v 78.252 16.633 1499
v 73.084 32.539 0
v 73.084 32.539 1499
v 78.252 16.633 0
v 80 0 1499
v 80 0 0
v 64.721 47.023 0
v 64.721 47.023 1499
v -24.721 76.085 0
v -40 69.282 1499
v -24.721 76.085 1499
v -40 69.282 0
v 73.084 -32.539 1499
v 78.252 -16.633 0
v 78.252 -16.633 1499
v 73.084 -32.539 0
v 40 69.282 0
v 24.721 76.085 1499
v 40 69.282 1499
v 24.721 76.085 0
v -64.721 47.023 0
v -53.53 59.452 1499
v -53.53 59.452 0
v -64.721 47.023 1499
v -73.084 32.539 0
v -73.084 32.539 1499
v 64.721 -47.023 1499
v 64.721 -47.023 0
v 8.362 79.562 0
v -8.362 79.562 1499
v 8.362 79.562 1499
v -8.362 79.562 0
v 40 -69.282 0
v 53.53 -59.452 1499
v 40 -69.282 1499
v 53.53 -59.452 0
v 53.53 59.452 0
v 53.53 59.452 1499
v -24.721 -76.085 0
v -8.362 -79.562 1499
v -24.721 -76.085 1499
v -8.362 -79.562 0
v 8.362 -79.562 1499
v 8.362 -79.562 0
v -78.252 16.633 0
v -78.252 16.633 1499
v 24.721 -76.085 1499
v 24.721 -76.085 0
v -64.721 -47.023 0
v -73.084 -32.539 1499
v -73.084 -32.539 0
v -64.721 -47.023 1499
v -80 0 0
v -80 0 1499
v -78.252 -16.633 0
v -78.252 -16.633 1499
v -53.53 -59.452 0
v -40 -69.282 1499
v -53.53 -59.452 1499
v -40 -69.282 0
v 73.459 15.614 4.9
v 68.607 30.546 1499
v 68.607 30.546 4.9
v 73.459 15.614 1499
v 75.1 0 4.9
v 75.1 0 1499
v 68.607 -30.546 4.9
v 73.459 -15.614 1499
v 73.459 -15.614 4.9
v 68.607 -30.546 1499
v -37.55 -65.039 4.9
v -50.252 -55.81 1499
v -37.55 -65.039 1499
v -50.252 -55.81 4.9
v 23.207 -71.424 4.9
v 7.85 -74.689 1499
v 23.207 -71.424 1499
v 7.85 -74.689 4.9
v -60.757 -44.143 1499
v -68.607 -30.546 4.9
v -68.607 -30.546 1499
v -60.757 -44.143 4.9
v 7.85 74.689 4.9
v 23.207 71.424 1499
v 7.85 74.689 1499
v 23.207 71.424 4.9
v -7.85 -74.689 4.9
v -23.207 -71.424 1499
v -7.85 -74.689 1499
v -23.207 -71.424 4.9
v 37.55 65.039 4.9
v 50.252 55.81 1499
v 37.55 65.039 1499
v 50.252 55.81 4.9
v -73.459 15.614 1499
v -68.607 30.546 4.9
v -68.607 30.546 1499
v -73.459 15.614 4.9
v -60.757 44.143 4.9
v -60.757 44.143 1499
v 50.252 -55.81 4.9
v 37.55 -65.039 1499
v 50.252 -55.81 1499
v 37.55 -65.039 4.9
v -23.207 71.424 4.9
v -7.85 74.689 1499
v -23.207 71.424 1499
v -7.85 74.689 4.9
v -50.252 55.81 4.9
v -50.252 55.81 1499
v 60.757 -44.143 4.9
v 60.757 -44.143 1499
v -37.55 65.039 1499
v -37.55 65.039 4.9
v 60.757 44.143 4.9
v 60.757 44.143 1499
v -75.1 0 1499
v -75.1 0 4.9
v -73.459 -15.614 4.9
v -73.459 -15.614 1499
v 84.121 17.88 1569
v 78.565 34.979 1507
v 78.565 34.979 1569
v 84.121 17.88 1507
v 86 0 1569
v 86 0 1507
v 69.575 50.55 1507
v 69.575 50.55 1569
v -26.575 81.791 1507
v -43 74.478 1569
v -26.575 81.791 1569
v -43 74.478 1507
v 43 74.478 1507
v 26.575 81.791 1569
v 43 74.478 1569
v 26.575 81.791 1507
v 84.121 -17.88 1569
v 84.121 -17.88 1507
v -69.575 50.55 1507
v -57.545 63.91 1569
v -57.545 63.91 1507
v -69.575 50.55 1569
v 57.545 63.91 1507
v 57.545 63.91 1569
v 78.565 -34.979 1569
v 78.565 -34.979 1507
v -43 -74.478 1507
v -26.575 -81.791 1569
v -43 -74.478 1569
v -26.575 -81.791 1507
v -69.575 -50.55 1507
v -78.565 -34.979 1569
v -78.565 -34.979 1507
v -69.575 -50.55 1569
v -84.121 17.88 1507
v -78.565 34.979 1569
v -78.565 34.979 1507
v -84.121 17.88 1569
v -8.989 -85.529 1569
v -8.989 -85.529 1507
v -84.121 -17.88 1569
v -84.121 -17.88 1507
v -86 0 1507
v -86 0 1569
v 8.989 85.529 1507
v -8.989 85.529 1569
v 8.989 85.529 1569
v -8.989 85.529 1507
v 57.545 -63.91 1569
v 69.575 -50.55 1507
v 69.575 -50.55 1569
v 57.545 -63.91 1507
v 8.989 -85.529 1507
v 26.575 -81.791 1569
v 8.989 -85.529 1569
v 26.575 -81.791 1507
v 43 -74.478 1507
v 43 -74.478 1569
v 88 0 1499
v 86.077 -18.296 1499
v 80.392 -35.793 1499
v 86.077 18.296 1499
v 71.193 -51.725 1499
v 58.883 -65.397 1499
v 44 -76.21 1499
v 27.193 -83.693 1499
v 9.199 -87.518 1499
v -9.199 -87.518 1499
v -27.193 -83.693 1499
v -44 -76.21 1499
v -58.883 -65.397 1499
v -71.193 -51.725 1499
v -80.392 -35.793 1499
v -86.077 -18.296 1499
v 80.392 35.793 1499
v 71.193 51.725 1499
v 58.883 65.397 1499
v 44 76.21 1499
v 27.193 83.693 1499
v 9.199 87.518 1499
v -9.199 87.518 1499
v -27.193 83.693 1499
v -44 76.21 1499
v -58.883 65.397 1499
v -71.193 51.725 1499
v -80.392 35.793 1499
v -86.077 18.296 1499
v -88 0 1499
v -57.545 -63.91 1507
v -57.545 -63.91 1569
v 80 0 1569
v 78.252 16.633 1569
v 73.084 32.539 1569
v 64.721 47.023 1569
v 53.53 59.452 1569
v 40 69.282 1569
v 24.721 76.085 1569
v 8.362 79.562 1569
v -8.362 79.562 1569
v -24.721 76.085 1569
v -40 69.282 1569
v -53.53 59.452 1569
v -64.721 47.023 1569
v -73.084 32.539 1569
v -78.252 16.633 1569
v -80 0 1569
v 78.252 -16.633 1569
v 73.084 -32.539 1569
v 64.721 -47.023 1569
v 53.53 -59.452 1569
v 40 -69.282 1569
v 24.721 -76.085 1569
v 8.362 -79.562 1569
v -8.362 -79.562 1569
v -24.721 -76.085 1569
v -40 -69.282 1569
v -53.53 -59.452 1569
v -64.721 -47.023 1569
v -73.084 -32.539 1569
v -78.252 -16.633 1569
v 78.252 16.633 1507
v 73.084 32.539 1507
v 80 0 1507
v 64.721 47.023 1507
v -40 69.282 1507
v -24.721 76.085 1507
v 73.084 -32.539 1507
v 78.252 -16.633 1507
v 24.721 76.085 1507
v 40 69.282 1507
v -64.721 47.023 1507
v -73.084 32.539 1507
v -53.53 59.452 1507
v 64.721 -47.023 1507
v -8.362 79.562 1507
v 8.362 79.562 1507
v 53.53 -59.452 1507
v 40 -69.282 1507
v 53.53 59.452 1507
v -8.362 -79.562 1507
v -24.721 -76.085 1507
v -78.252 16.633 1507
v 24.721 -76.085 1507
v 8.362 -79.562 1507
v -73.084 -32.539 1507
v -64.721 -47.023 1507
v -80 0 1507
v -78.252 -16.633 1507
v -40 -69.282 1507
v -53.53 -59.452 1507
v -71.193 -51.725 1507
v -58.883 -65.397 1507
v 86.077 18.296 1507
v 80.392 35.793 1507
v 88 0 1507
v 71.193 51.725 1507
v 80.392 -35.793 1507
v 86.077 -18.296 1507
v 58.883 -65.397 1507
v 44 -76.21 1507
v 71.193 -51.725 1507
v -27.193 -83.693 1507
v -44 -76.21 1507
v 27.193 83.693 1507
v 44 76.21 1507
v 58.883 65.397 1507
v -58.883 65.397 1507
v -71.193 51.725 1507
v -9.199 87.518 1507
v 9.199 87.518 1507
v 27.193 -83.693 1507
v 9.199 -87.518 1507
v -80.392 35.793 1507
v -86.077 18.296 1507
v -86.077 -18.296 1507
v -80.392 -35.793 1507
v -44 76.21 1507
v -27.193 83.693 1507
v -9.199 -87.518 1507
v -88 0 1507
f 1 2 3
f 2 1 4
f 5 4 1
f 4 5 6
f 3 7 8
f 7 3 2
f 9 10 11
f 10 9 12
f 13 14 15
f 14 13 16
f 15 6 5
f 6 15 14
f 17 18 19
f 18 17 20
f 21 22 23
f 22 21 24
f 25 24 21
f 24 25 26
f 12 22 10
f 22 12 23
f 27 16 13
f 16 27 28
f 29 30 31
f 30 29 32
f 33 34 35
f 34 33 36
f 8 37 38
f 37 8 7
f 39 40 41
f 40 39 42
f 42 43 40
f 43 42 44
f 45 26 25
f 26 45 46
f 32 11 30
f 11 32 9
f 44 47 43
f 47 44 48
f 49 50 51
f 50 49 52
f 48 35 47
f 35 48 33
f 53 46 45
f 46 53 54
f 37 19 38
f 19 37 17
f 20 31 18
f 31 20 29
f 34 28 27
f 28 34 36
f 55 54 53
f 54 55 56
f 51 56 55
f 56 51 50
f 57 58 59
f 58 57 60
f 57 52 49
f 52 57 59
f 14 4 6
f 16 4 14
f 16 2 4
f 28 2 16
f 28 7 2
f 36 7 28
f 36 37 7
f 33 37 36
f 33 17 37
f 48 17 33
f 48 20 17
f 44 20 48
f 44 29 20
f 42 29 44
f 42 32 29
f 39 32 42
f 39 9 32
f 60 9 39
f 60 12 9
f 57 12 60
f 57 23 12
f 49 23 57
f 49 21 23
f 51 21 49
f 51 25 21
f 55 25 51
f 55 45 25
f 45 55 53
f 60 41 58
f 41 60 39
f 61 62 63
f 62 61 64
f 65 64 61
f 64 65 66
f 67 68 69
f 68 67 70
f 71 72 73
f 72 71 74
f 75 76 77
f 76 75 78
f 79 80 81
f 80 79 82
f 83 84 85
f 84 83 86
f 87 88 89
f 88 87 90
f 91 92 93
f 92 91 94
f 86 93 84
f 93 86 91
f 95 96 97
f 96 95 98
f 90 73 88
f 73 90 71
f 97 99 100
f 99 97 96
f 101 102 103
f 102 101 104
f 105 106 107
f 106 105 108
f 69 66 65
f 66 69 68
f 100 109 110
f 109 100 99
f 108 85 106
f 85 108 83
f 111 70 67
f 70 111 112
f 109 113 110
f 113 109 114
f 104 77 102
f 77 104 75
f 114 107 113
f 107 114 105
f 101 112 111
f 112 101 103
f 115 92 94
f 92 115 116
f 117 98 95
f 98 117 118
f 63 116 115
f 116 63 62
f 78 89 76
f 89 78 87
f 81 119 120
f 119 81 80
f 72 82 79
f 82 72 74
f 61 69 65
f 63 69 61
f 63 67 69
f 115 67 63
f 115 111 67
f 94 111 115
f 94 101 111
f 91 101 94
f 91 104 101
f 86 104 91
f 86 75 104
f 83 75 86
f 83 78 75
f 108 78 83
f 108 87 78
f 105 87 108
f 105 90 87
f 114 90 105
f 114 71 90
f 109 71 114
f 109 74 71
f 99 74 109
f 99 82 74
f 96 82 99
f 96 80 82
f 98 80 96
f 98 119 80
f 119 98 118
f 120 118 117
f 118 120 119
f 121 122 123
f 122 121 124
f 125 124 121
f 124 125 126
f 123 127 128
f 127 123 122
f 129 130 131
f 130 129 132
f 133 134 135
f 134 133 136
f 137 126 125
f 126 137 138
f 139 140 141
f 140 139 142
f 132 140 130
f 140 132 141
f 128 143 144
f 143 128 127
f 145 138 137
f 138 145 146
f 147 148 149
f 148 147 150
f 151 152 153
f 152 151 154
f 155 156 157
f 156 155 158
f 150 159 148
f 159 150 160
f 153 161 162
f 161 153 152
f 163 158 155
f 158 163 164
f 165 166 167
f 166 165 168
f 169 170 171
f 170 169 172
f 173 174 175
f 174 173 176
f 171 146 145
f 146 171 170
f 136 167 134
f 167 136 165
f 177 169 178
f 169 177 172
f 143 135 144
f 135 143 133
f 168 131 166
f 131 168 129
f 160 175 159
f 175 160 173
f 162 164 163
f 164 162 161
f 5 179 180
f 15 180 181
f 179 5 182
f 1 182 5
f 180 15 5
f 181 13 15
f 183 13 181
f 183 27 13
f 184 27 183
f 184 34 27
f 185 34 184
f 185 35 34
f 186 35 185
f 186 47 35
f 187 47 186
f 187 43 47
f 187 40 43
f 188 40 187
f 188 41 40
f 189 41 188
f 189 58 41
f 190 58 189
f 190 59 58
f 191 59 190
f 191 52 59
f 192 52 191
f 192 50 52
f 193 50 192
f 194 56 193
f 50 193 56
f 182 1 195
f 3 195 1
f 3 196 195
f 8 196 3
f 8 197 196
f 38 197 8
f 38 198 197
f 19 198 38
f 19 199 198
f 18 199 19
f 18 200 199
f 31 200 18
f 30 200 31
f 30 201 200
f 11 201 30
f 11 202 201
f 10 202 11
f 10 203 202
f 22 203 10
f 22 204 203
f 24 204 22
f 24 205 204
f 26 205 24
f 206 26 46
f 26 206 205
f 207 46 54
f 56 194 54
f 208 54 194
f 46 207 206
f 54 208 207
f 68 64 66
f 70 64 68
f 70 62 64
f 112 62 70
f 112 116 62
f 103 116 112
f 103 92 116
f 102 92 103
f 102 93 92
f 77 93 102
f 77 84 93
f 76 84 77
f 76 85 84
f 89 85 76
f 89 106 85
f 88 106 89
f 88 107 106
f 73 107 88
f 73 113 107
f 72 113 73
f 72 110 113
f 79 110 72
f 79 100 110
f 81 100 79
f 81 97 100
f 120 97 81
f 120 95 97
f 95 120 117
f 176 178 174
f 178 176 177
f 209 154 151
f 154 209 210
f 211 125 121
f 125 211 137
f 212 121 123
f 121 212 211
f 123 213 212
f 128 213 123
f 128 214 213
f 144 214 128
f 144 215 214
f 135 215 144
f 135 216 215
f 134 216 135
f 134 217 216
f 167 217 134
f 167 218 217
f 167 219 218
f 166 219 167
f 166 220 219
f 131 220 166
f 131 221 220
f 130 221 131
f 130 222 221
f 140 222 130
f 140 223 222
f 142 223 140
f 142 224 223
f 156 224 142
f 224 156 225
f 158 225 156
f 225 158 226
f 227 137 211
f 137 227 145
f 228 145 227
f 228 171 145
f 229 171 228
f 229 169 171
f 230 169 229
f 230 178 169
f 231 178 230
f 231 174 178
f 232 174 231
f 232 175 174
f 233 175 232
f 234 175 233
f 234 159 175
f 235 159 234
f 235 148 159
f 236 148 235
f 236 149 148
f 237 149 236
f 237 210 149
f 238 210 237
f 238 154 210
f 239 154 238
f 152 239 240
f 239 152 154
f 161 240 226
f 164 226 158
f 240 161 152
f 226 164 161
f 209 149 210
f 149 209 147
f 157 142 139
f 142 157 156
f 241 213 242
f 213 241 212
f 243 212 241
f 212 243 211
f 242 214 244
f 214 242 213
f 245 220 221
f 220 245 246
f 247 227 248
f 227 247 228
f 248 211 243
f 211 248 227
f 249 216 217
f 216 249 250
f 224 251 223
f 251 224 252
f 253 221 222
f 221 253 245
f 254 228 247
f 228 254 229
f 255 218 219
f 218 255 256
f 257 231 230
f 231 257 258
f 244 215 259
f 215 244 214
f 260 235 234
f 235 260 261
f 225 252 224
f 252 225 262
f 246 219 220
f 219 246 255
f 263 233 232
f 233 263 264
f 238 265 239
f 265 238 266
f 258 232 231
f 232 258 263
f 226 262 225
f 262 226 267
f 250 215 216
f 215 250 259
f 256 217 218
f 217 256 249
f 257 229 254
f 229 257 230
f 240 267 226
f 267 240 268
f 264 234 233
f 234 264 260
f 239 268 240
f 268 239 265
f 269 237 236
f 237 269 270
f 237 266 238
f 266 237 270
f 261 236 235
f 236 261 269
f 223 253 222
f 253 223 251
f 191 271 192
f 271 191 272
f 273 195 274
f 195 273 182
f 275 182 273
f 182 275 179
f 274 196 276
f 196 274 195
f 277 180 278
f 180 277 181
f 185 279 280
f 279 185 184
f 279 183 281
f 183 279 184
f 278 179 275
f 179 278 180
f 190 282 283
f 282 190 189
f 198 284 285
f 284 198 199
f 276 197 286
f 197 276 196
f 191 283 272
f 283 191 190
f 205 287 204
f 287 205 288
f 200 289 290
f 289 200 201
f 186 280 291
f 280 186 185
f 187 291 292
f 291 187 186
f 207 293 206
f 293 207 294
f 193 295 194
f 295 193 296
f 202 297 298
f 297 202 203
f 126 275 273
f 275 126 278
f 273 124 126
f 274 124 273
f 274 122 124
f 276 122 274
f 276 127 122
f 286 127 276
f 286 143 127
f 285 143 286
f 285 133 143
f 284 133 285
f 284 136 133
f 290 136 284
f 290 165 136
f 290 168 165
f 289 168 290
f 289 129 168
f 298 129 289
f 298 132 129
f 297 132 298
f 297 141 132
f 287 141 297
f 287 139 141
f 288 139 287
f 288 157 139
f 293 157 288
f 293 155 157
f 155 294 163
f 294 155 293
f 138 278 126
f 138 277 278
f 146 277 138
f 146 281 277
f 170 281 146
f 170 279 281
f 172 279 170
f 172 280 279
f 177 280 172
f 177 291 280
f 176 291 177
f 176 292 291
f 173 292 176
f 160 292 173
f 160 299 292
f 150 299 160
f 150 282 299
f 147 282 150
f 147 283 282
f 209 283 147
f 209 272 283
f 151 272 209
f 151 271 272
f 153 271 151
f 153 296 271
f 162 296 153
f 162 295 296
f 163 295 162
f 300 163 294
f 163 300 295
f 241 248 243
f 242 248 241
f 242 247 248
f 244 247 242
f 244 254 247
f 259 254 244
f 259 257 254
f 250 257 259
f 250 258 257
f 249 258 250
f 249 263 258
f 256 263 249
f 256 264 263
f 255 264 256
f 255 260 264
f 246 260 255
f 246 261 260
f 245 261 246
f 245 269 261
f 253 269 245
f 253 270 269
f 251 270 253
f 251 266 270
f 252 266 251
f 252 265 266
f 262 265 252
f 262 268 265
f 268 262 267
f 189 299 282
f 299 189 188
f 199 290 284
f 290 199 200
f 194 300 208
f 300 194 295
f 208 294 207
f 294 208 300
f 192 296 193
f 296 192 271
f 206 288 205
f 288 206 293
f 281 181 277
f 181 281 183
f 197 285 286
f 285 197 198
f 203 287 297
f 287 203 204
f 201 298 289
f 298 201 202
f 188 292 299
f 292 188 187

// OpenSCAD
// Parameters
nominal_diameter_mm = 160; //[80:320:1]
length_mm = 1500; //[750:3000:1]
wall_thickness_mm = 4.9; //[2.5:10:0.1]
fit_socket_length_mm = 70; //[35:140:1]
fit_socket_wall_mm = 6; //[3:12:0.1]
fit_stop_ring_length_mm = 8; //[4:20:1]
fit_stop_ring_radial_mm = 2; //[1:6:0.1]
fit_overlap_mm = 1; //[0.5:2:0.1]

// HT Pipe - complete geometry
module ht_pipe() {
  color([0.85, 0.85, 0.8]) { // PVC color
    // Pipe body
    difference() {
      cylinder(h=length_mm, r=nominal_diameter_mm/2, center=false);
      translate([0, 0, wall_thickness_mm])
        cylinder(h=length_mm, r=nominal_diameter_mm/2 - wall_thickness_mm, center=false);
    }
    
    // End fitting
    translate([0, 0, length_mm - fit_overlap_mm]) {
      // Socket shell
      difference() {
        cylinder(h=fit_socket_length_mm, r=nominal_diameter_mm/2 + fit_socket_wall_mm, center=false);
        cylinder(h=fit_socket_length_mm, r=nominal_diameter_mm/2, center=false);
      }
      
      // Stop ring
      translate([0, 0, 0]) {
        cylinder(h=fit_stop_ring_length_mm, r=nominal_diameter_mm/2 + fit_socket_wall_mm + fit_stop_ring_radial_mm, center=false);
      }
    }
  }
}

// Assembly
module assembly() {
  ht_pipe();
}

assembly();
